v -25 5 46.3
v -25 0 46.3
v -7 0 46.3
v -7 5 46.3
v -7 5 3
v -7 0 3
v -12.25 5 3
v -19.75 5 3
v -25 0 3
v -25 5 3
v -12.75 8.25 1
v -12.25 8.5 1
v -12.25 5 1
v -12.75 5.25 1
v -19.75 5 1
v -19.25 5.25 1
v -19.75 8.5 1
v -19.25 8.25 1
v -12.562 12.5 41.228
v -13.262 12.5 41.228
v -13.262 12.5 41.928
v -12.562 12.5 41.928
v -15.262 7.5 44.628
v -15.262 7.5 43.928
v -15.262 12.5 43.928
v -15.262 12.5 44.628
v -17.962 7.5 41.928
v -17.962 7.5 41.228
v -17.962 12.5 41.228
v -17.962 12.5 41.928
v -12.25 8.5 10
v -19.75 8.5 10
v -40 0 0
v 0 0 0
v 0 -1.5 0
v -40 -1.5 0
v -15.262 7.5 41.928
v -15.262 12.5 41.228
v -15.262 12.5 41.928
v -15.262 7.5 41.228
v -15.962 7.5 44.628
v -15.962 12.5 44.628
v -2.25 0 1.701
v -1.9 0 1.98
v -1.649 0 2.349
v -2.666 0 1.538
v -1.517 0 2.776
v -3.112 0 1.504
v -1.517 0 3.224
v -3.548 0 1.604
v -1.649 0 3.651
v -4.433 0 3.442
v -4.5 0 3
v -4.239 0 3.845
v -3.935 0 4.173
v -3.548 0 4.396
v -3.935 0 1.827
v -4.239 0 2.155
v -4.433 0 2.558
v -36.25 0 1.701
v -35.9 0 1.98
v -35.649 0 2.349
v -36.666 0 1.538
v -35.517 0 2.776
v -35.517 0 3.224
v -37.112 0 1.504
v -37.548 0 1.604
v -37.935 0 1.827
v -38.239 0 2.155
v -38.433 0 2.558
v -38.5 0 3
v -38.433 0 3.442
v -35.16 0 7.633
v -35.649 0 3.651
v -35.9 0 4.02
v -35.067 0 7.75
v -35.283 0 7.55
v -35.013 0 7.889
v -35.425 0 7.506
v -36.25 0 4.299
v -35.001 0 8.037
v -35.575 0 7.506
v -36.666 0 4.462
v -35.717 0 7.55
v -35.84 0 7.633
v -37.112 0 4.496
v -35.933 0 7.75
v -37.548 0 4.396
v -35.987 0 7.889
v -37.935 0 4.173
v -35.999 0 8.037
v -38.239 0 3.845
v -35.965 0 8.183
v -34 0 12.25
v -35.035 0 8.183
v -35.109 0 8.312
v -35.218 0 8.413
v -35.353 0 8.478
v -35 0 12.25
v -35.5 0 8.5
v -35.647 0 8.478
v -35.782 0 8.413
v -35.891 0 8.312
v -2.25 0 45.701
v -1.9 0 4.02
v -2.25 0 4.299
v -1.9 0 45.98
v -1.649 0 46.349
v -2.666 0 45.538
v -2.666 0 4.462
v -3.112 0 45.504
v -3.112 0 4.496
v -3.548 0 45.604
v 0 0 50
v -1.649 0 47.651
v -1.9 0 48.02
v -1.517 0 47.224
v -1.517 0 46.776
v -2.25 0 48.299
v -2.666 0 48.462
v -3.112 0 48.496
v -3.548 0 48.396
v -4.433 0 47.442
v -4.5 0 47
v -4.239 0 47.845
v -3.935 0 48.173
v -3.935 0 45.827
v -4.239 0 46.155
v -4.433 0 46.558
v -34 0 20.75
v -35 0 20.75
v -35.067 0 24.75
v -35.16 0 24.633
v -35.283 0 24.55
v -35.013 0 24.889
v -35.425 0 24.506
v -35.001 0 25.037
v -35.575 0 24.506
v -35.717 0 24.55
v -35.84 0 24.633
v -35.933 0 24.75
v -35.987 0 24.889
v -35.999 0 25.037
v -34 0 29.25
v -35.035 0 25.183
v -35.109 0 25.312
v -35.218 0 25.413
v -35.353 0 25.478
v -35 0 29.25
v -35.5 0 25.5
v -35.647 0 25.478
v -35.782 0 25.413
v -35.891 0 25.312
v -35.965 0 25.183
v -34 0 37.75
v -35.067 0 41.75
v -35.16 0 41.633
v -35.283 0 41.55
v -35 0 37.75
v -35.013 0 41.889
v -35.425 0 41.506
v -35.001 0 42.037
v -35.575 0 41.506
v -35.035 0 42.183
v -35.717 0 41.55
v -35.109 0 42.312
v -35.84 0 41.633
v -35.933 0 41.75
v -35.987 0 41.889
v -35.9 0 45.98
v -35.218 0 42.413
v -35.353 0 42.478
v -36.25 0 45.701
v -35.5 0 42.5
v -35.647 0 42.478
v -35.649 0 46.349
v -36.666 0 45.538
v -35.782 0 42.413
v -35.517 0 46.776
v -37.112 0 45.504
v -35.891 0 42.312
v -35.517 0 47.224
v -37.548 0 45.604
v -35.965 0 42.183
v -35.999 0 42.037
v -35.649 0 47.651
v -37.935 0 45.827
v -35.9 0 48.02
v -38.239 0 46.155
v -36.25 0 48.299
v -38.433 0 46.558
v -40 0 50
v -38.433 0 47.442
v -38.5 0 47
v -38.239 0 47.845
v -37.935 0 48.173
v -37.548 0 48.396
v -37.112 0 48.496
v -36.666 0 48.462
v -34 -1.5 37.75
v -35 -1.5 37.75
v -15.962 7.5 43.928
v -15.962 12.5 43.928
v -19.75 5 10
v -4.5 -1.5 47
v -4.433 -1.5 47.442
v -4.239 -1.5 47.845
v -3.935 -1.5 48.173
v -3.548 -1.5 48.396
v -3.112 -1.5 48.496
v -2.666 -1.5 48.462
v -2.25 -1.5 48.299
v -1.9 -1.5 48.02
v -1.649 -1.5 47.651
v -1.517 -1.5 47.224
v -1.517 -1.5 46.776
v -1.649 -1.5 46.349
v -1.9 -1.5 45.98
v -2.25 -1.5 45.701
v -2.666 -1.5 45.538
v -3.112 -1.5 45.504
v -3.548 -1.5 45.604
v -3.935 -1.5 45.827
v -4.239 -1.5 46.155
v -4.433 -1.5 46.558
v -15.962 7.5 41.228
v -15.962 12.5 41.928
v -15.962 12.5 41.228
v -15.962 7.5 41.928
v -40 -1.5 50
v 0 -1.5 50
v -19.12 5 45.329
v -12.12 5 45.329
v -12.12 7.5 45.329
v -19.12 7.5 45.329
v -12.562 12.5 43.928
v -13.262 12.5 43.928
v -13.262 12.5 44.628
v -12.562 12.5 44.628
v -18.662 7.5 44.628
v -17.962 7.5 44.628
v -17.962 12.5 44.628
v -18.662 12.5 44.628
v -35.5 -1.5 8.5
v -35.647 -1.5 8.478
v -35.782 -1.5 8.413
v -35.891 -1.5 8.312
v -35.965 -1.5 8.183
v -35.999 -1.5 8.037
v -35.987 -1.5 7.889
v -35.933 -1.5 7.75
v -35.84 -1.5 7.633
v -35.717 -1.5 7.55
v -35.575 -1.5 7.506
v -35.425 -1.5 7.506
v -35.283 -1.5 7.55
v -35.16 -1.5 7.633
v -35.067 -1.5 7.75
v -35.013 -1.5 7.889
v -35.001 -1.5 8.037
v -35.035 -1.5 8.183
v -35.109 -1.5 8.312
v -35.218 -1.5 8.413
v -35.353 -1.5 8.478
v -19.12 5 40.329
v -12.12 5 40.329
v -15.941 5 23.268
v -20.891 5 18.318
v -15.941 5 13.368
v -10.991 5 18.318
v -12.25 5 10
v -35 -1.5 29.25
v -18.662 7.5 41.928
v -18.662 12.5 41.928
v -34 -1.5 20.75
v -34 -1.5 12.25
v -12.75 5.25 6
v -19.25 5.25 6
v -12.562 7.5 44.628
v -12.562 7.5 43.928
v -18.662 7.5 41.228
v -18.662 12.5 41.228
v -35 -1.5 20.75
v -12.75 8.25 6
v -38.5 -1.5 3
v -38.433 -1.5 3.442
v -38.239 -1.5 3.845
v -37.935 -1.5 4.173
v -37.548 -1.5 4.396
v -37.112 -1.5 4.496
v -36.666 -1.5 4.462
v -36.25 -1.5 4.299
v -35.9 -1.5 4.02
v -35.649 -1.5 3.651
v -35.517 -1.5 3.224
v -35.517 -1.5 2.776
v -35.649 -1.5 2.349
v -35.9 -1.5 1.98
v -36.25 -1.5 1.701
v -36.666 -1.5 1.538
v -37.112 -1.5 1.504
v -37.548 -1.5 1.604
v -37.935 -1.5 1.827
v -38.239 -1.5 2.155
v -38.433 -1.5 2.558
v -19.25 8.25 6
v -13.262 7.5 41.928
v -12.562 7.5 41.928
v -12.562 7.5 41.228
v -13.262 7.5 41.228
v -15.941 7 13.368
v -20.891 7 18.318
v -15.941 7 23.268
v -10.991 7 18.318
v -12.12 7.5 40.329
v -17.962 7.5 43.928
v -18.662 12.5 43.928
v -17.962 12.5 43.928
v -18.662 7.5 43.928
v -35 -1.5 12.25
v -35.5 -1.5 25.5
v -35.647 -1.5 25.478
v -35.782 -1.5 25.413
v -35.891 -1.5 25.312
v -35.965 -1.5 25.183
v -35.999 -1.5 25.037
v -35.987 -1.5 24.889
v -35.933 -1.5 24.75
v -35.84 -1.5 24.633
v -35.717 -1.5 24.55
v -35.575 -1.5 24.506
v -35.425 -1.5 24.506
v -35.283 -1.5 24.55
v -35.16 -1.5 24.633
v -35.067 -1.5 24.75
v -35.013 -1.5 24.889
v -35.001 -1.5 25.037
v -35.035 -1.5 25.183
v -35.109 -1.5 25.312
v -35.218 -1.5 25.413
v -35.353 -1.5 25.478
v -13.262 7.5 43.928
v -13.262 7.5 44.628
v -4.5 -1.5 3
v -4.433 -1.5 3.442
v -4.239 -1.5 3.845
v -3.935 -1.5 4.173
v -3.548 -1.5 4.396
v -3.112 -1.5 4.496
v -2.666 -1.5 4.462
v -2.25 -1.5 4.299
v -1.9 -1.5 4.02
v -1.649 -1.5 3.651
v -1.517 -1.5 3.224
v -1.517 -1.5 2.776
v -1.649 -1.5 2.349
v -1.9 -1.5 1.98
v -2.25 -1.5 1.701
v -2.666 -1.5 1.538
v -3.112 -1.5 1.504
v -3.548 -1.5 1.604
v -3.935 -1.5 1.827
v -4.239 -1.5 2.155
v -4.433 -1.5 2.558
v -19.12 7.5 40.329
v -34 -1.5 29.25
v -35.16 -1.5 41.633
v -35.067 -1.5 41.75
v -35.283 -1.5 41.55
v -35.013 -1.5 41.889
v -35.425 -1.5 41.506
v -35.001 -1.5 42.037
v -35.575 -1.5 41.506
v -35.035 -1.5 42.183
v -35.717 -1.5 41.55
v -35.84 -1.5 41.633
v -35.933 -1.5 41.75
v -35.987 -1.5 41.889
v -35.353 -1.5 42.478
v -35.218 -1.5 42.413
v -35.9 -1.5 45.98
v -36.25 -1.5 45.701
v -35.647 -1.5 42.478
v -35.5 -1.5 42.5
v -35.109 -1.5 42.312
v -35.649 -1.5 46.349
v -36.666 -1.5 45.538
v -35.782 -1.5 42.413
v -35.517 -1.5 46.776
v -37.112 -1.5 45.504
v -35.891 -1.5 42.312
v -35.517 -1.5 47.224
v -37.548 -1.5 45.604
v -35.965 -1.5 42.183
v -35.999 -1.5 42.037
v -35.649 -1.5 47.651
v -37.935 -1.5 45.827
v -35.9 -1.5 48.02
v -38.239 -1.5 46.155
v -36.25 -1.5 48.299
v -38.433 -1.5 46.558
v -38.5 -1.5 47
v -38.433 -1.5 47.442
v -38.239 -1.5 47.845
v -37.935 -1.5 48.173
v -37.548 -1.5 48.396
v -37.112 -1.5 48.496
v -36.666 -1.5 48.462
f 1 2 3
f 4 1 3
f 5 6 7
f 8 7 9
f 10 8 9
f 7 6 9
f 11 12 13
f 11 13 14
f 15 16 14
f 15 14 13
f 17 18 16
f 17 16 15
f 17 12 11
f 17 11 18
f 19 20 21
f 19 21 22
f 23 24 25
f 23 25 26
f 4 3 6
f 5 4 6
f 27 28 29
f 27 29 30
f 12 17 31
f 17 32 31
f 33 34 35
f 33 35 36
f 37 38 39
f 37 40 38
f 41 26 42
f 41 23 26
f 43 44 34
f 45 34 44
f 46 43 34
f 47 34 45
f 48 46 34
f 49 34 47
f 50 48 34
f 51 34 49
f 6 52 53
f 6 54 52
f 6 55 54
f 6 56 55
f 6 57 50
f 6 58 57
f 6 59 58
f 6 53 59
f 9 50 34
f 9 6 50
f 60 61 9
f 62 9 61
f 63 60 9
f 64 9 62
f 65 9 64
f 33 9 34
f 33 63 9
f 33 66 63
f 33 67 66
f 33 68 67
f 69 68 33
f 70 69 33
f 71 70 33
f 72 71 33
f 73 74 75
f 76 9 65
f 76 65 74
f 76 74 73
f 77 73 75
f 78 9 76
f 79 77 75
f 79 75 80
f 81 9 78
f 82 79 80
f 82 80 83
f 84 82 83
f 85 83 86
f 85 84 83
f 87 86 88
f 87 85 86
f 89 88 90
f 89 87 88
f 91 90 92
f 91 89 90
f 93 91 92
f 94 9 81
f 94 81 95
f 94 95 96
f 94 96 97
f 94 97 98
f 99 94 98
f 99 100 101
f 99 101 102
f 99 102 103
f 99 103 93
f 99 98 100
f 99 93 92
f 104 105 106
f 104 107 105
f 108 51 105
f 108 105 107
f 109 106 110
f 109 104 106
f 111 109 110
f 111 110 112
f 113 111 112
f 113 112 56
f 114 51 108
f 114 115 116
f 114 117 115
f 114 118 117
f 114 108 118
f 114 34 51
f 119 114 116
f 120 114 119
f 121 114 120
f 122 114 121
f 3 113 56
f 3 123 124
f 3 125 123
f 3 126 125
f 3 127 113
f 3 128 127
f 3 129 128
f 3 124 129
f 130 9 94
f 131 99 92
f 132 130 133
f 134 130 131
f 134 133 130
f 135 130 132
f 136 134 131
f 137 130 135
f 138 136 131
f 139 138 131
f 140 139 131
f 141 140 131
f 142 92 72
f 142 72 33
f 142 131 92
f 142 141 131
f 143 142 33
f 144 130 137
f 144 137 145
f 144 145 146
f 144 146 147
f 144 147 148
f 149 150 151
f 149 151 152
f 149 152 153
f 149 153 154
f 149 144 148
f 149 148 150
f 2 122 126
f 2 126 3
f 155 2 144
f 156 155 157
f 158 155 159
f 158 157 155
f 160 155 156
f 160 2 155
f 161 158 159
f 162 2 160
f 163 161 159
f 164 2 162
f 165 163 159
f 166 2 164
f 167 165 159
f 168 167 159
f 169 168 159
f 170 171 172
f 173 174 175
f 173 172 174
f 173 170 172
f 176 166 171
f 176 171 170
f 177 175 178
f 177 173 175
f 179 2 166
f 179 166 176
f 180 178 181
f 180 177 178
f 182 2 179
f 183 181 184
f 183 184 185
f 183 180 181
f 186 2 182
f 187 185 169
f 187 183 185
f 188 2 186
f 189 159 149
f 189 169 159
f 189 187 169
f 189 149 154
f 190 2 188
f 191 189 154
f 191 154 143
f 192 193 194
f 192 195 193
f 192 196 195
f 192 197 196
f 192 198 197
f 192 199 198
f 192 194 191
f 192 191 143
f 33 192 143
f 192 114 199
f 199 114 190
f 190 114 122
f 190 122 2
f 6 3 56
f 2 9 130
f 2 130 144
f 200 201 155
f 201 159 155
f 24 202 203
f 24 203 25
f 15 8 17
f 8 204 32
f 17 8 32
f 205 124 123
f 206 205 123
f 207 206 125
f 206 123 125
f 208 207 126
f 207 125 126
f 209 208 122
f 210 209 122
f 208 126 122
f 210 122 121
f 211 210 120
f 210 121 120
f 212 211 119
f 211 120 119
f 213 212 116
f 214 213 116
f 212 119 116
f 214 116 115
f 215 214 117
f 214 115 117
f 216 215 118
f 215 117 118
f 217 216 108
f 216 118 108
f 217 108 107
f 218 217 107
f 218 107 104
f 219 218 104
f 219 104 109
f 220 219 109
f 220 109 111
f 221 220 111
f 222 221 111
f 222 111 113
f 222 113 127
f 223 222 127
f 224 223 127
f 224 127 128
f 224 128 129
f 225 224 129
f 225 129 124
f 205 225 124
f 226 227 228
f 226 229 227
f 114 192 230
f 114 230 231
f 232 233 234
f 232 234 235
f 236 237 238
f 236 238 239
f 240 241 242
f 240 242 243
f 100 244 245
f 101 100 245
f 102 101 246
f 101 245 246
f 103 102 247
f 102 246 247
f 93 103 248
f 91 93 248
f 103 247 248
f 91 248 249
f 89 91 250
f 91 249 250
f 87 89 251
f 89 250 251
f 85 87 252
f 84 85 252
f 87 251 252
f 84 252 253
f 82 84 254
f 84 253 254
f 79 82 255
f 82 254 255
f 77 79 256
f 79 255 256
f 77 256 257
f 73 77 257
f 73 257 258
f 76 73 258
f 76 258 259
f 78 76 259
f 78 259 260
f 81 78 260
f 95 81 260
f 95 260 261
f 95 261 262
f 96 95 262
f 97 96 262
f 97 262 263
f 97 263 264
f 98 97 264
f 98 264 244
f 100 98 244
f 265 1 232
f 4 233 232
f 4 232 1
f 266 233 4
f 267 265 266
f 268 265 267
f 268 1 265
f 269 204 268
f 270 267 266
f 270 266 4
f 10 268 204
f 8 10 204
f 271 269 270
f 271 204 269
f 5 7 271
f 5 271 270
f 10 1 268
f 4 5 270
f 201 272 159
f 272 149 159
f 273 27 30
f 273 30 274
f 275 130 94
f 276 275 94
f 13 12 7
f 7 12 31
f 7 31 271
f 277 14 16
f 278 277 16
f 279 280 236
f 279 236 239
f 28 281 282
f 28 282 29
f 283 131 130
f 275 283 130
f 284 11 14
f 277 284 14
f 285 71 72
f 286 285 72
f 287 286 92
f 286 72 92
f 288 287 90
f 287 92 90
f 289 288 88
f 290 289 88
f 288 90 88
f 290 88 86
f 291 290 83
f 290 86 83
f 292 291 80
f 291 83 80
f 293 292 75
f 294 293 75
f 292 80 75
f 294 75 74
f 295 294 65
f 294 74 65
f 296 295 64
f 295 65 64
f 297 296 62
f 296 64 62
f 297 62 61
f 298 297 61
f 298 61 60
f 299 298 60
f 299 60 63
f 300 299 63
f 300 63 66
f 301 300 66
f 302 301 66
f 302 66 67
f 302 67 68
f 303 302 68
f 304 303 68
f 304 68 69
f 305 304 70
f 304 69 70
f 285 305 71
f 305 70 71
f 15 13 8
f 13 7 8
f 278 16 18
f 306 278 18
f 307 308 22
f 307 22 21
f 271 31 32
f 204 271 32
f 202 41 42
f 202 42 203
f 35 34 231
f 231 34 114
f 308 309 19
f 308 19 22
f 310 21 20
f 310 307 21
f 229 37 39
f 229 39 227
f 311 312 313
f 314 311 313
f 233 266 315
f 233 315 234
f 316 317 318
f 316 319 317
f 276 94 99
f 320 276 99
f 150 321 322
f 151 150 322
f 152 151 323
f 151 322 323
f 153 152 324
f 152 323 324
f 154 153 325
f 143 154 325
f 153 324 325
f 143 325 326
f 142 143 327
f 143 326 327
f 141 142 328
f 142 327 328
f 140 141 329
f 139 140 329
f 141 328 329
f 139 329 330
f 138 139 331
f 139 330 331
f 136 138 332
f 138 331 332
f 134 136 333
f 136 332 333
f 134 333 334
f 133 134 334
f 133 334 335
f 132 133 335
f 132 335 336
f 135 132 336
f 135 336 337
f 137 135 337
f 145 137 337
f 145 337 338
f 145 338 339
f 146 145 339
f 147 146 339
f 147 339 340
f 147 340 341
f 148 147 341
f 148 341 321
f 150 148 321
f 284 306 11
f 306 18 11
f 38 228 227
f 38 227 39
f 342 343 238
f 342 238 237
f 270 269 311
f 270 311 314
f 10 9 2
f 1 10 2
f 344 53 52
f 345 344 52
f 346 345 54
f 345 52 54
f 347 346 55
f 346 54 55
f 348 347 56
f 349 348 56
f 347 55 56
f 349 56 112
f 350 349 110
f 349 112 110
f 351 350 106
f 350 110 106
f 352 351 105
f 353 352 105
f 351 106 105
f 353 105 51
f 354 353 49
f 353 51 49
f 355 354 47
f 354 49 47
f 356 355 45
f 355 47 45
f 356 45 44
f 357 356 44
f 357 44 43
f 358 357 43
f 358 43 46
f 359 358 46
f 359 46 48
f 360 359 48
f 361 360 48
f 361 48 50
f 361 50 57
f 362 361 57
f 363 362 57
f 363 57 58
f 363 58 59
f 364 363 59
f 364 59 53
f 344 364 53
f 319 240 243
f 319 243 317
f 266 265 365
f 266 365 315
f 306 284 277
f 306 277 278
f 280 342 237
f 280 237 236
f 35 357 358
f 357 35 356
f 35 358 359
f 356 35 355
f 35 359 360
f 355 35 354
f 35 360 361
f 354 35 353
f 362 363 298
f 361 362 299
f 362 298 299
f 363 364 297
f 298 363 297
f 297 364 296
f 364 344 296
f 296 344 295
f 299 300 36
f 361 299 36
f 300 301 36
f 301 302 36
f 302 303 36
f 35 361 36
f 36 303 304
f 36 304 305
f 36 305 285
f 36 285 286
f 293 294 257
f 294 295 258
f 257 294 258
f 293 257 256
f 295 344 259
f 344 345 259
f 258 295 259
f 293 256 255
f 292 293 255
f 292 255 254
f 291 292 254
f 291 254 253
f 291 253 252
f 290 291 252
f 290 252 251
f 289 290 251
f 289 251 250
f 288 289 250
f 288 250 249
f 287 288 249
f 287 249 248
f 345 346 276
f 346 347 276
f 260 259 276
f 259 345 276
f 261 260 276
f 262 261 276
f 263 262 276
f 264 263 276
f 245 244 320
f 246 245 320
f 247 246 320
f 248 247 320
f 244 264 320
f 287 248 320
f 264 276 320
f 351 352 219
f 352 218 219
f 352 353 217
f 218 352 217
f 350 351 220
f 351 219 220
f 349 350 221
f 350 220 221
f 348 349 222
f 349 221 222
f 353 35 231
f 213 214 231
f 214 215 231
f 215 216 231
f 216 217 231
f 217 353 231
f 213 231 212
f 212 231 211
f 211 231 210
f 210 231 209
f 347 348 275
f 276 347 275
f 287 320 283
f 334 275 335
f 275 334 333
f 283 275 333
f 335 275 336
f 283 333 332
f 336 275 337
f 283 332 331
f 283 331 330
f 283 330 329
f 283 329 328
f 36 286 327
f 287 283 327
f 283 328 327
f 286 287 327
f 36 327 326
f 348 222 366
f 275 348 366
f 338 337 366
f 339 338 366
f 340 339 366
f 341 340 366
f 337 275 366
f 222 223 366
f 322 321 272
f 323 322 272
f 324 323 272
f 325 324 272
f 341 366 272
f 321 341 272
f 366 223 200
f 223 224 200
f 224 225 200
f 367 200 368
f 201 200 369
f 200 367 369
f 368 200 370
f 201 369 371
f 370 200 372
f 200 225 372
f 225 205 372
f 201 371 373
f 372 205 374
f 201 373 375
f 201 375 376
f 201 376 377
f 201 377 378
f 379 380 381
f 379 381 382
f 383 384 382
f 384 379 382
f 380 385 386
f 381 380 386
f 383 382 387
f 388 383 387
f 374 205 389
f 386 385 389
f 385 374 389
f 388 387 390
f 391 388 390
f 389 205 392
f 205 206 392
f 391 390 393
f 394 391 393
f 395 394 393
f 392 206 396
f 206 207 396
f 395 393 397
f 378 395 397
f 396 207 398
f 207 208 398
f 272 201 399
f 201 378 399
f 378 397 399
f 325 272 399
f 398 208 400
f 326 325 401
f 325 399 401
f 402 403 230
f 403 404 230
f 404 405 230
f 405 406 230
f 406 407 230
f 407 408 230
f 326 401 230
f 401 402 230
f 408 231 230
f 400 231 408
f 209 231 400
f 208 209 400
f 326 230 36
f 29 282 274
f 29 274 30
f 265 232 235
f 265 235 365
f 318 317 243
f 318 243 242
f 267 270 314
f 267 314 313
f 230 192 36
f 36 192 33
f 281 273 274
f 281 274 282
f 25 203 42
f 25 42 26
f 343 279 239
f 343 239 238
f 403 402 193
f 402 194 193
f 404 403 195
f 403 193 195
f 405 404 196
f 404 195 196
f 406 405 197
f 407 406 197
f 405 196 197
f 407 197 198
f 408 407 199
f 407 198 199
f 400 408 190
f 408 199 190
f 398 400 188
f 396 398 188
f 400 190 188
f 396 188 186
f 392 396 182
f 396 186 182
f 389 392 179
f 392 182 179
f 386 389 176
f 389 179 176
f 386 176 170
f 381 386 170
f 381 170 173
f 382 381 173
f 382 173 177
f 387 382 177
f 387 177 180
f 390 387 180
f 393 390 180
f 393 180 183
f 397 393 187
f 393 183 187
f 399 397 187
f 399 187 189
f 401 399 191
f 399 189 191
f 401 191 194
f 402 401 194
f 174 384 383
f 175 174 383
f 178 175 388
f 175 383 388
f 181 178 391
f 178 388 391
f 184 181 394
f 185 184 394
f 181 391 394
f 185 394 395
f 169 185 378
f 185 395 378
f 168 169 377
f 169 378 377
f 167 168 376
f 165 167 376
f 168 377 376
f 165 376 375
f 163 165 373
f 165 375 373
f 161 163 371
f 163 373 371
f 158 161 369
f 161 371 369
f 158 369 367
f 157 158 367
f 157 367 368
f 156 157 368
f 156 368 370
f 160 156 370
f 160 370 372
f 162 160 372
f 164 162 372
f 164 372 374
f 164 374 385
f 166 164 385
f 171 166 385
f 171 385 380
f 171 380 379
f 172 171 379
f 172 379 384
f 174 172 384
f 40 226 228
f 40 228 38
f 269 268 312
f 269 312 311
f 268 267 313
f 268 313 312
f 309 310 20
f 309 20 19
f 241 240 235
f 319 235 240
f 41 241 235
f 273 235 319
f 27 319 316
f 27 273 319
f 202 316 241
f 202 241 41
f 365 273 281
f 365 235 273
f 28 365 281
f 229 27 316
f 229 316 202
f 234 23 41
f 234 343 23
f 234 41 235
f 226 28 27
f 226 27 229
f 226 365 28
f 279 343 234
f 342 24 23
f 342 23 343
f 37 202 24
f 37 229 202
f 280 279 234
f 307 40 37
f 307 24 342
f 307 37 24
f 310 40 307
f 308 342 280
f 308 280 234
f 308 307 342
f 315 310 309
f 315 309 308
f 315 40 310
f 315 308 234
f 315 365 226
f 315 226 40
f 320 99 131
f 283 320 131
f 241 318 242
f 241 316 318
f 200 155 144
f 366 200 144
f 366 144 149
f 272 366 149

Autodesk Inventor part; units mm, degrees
ref_plane "YZ Plane" through (0, 0, 0) normal (1, 0, 0) x (0, 1, 0)
ref_plane "XZ Plane" through (0, 0, 0) normal (0, 1, 0) x (-1, 0, 0)
ref_plane "XY Plane" through (0, 0, 0) normal (0, 0, 1) x (1, 0, 0)
sketch "Sketch1" plane through (0, 0, 0) normal (0, 1, 0) x (-1, 0, 0)
  line L0 (40, 50) -> (40, 0)
  line L1 (35, 12.25) -> (35, 20.75)
  line L2 (35, 20.75) -> (34, 20.75)
  line L3 (34, 20.75) -> (34, 12.25)
  line L4 (34, 12.25) -> (35, 12.25)
  line L5 (34, 29.25) -> (35, 29.25)
  line L6 (35, 29.25) -> (35, 37.75)
  line L7 (35, 37.75) -> (34, 37.75)
  line L8 (34, 37.75) -> (34, 29.25)
  line L9 (40, 50) -> (0, 50)
  line L10 (0, 0) -> (40, 0)
  line L11 (17.2477, 25) -> (11.4252, 25) construction
  line L12 (0, 0) -> (0, 50)
  circle A0 centre (37, 47) radius 1.5
  circle A1 centre (3, 47) radius 1.5
  circle A2 centre (37, 3) radius 1.5
  circle A3 centre (3, 3) radius 1.5
  point P0 (0, 0)
  point P1 (0, 0)
  point P2 (0, 0)
  point P3 (0, 0)
  point P4 (35.5, 42)
  point P5 (35.5, 25)
  point P6 (35.5, 8)
  dimension "d151" = 8.5
  dimension "d153" = 1
  dimension "d155" = 5
  dimension "d159" = 17
  dimension "d160" = 17
  dimension "d161" = 4.25
  dimension "d162" = 4.25
  dimension "d176" = 4.5
  dimension "d248" = 40
  dimension "d249" = 50
  dimension "d250" = 3
  dimension "d251" = 3
  dimension "d252" = 3
  dimension "d253" = 3
  dimension "d254" = 3
extrude "Extrusion1" add sketch "Sketch1" against normal blind 1.5
hole "Hole1" at (-35.5, 0, 42) at (-35.5, 0, 25) at (-35.5, 0, 8) direction (0, -1, 0) diameter 1 end through all
sketch "Sketch4" plane through (0, 0, 0) normal (0, 1, 0) x (1, 0, 0)
  line L0 (-7, -46.3) -> (-7, -3)
  line L1 (-7, -3) -> (-25, -3)
  line L2 (-25, -3) -> (-25, -46.3)
  line L3 (-25, -46.3) -> (-7, -46.3)
  line L4 (-40, 0) -> (0, 0) projected
  line L5 (0, 0) -> (0, -50) projected
  dimension "d189" = 18
  dimension "d255" = 3
  dimension "d256" = 7
  dimension "d257" = 43.3
extrude "Extrusion11" add sketch "Sketch4" along normal blind 5
sketch "Sketch6" plane through (0, 5, 0) normal (0, 1, 0) x (1, 0, 0)
  line L0 (-20.8908, -18.3177) -> (-15.941, -13.368)
  line L1 (-15.941, -13.368) -> (-10.9913, -18.3177)
  line L2 (-10.9913, -18.3177) -> (-15.941, -23.2675)
  line L3 (-15.941, -23.2675) -> (-20.8908, -18.3177)
  point P0 (0, 0)
  dimension "d198" = 7
  dimension "d199" = 7
extrude "Extrusion13" add sketch "Sketch6" along normal blind 2
sketch "Sketch7" plane through (0, 5, 0) normal (0, 1, 0) x (1, 0, 0)
  line L0 (-19.1198, -40.3292) -> (-12.1198, -40.3292)
  line L1 (-12.1198, -40.3292) -> (-12.1198, -45.3292)
  line L2 (-12.1198, -45.3292) -> (-19.1198, -45.3292)
  line L3 (-19.1198, -45.3292) -> (-19.1198, -40.3292)
  point P0 (0, 0)
  dimension "d202" = 7
  dimension "d203" = 5
extrude "Extrusion14" add sketch "Sketch7" along normal blind 2.5
sketch "Sketch8" plane through (0, 7.5, 0) normal (0, 1, 0) x (1, 0, 0)
  line L0 (-18.6618, -41.2282) -> (-17.9618, -41.2282)
  line L1 (-17.9618, -41.2282) -> (-17.9618, -41.9282)
  line L2 (-17.9618, -41.9282) -> (-18.6618, -41.9282)
  line L3 (-18.6618, -41.9282) -> (-18.6618, -41.2282)
  line L4 (-18.6618, -43.9282) -> (-17.9618, -43.9282)
  line L5 (-17.9618, -43.9282) -> (-17.9618, -44.6282)
  line L6 (-17.9618, -44.6282) -> (-18.6618, -44.6282)
  line L7 (-18.6618, -44.6282) -> (-18.6618, -43.9282)
  line L8 (-15.9618, -41.2282) -> (-15.2618, -41.2282)
  line L9 (-15.2618, -41.2282) -> (-15.2618, -41.9282)
  line L10 (-15.2618, -41.9282) -> (-15.9618, -41.9282)
  line L11 (-15.9618, -41.9282) -> (-15.9618, -41.2282)
  line L12 (-15.9618, -43.9282) -> (-15.2618, -43.9282)
  line L13 (-15.2618, -43.9282) -> (-15.2618, -44.6282)
  line L14 (-15.2618, -44.6282) -> (-15.9618, -44.6282)
  line L15 (-15.9618, -44.6282) -> (-15.9618, -43.9282)
  line L16 (-13.2618, -41.2282) -> (-12.5618, -41.2282)
  line L17 (-12.5618, -41.2282) -> (-12.5618, -41.9282)
  line L18 (-12.5618, -41.9282) -> (-13.2618, -41.9282)
  line L19 (-13.2618, -41.9282) -> (-13.2618, -41.2282)
  line L20 (-13.2618, -43.9282) -> (-12.5618, -43.9282)
  line L21 (-12.5618, -43.9282) -> (-12.5618, -44.6282)
  line L22 (-12.5618, -44.6282) -> (-13.2618, -44.6282)
  line L23 (-13.2618, -44.6282) -> (-13.2618, -43.9282)
  point P0 (0, 0)
  dimension "d206" = 0.7
  dimension "d207" = 2
  dimension "d208" = 2
  dimension "d209" = 2
extrude "Extrusion15" add sketch "Sketch8" along normal blind 5
sketch "Sketch9" plane through (-3, 0, 3) normal (0, 0, -1) x (-1, 0, 0)
  line L0 (16.75, 8.5) -> (9.25, 8.5)
  line L1 (9.25, 8.5) -> (9.25, 5)
  line L2 (9.25, 5) -> (16.75, 5)
  line L3 (16.75, 5) -> (16.75, 8.5)
  line L4 (13, 5.7242) -> (13, 7.4058) construction
  line L5 (22, 0) -> (22, 5) projected
  line L6 (4, 5) -> (22, 5) projected
  dimension "d213" = 7.5
  dimension "d214" = 3.5
  dimension "d258" = 5.25
extrude "Extrusion16" add sketch "Sketch9" along normal blind 2 and the other way blind 7
sketch "Sketch15" plane through (-3, 0, 1) normal (0, 0, -1) x (-1, 0, 0)
  line L0 (16.25, 8.25) -> (9.75, 8.25)
  line L1 (9.75, 8.25) -> (9.75, 5.25)
  line L2 (9.75, 5.25) -> (16.25, 5.25)
  line L3 (16.25, 5.25) -> (16.25, 8.25)
  line L4 (9.25, 8.5) -> (9.25, 5) projected
  line L5 (16.75, 8.5) -> (9.25, 8.5) projected
  point P0 (-3, 0)
  dimension "d242" = 6.5
  dimension "d243" = 3
  dimension "d244" = 0.5
  dimension "d245" = 0.25
extrude "Extrusion20" cut sketch "Sketch15" against normal blind 5
properties part number "Motherboard_dummy" material "ABS Plastic"
